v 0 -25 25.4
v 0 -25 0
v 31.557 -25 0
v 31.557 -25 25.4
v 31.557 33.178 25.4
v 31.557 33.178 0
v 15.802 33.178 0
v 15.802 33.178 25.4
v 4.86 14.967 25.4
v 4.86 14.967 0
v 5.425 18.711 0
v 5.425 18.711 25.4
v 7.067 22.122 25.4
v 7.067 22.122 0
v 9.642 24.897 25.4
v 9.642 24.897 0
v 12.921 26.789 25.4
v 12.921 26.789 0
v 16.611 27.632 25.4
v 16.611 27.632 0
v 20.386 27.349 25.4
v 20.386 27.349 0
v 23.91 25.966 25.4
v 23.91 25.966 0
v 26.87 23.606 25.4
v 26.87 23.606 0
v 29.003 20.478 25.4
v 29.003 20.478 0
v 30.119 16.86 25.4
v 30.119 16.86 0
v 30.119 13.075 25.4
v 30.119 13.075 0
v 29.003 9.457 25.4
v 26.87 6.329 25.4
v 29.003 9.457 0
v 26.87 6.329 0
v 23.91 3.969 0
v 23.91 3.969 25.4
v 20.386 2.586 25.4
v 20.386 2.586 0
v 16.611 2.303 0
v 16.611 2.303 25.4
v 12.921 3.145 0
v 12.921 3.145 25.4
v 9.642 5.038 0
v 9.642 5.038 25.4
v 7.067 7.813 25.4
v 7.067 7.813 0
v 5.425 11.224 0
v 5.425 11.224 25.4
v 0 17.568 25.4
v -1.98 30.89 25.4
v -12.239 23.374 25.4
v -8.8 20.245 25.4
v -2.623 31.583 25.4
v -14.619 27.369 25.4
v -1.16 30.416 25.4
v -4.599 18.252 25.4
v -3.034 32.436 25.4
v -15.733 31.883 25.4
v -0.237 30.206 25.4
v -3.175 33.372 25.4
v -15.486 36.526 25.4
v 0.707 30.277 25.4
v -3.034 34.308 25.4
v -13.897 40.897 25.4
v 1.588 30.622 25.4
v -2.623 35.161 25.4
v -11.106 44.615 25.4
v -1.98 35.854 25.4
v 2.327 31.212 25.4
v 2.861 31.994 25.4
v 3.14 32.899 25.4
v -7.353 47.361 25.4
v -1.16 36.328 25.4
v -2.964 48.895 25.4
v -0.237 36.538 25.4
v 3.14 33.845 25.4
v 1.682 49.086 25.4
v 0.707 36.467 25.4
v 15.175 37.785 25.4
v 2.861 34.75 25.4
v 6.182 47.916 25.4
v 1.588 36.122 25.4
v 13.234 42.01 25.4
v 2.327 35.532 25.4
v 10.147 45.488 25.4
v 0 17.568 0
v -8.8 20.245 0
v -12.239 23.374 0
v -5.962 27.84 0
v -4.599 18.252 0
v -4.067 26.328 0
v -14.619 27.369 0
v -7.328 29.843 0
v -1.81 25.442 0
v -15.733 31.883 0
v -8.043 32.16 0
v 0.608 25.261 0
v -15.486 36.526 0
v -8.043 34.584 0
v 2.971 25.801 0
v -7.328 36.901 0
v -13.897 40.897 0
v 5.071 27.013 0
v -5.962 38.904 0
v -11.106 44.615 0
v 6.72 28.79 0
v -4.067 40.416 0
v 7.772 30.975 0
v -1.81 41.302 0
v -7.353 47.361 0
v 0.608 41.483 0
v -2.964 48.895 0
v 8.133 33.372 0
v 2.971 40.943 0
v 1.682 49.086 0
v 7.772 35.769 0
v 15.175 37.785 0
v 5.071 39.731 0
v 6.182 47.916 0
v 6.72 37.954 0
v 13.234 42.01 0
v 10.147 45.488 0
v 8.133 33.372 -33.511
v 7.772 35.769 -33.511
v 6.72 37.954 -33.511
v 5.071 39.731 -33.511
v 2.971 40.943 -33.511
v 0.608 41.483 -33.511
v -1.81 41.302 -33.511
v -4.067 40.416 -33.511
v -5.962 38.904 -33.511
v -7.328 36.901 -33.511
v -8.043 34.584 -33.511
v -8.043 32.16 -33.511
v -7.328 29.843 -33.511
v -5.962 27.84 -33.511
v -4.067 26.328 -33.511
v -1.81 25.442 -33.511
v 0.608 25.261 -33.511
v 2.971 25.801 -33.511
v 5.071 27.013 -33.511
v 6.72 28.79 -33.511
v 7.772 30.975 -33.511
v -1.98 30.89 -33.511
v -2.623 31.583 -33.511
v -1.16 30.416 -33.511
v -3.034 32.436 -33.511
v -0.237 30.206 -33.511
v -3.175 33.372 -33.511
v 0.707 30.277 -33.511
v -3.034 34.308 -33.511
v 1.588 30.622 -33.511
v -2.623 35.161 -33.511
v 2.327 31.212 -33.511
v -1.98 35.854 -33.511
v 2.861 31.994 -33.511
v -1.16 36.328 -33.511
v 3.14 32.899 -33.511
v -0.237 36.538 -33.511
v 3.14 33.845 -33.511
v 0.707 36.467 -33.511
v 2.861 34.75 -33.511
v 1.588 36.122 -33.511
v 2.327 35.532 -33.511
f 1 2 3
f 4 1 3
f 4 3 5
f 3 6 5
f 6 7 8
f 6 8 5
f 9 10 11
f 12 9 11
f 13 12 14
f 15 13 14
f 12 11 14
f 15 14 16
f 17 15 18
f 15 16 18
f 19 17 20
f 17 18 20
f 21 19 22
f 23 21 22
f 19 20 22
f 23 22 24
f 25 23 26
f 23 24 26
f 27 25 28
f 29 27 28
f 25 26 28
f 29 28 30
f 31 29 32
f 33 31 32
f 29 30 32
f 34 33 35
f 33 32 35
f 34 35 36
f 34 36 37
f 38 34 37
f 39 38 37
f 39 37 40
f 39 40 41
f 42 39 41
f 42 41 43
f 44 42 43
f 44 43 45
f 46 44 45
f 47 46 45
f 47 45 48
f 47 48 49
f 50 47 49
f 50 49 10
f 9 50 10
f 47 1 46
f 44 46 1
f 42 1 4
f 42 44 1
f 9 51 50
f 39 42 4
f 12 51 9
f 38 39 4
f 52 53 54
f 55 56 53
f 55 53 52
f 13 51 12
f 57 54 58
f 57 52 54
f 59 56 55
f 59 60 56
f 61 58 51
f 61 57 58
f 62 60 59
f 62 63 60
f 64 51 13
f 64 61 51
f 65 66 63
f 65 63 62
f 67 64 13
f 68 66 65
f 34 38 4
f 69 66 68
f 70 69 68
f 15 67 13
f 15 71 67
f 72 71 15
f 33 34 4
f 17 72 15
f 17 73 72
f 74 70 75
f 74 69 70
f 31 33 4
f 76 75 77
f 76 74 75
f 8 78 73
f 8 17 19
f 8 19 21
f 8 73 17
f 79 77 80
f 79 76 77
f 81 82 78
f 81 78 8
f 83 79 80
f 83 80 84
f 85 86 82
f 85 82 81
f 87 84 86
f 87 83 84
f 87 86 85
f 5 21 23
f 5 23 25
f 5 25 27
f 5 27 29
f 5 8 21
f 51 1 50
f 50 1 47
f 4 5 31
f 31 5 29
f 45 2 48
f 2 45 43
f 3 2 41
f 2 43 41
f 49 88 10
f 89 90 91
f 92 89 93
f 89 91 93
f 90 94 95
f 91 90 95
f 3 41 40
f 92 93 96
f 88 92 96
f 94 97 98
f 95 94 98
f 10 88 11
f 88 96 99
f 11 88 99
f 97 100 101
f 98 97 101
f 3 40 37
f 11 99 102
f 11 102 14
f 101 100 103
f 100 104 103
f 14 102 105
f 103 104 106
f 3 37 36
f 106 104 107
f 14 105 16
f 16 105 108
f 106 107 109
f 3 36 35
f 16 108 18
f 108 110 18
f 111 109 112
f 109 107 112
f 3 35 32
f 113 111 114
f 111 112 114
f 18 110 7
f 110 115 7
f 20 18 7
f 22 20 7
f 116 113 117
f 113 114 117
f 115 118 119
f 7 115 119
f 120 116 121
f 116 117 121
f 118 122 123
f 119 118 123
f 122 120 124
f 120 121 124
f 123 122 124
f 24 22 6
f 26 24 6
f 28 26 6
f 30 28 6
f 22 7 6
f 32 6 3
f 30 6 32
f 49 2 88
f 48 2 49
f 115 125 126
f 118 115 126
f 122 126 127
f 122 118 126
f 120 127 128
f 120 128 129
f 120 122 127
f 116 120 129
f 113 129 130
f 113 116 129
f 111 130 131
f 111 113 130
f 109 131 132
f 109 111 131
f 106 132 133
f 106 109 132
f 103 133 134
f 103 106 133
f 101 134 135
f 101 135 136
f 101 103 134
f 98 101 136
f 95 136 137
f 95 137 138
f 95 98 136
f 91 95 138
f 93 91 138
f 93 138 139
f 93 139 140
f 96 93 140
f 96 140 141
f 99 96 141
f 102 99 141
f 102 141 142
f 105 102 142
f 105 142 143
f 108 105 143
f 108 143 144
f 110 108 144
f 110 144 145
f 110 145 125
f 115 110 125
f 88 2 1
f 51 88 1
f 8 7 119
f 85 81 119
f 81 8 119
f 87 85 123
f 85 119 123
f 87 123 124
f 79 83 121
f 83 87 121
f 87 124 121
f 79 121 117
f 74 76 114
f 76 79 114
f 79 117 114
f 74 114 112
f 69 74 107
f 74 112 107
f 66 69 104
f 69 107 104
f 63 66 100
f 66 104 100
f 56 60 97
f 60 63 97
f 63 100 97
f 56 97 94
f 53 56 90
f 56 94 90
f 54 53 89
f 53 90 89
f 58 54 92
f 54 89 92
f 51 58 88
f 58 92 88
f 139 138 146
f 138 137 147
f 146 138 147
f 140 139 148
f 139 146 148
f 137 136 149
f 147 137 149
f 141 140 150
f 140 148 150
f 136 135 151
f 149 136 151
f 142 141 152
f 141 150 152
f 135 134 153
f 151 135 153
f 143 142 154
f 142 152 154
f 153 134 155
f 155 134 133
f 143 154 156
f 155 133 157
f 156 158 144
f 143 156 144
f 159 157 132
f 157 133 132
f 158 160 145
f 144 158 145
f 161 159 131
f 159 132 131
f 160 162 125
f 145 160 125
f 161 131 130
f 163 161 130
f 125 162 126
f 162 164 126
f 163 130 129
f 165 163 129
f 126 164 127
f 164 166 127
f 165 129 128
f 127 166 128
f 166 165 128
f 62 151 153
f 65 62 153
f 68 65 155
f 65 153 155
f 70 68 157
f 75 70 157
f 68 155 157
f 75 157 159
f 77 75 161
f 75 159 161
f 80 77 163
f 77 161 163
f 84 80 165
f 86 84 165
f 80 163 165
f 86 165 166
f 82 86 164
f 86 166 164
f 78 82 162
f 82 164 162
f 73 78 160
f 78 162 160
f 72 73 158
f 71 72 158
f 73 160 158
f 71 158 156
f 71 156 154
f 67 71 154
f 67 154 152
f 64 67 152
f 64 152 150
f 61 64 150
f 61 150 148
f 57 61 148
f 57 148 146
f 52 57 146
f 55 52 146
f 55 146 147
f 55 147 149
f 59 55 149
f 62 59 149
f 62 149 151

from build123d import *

# Parameters (mm, degrees)
F1_R      = 15.8036743057
F2_DEPTH  = 25.4
F0_W      = 31.5568223596
F0_H      = 33.1780388951
F3_DEPTH  = 25.4
F4_R      = 8.1334827116
F5_DEPTH  = 58.9108746499
F7_D      = 6.35
F9_D      = 25.4
F14_DEPTH = 25


# Not quite as in the source:
# - the program builds the solid bodies; features that only make, move or delete a surface that nothing else refers to are left out


with BuildPart() as f2:
    # F1 (on face) → F2 (new body)
    with BuildSketch(Plane.XY):
        with Locations((0, 33.3719775081)):
            Circle(F1_R)
    extrude(amount=F2_DEPTH)

    # F0 (on Top) → F3 (join)
    with BuildSketch(Plane.XY):
        with Locations((15.7784111798, 16.5890194476)):
            Rectangle(F0_W, F0_H)
    extrude(amount=F3_DEPTH)

    # F4 (on face) → F5 (join)
    with BuildSketch(Plane.XY.offset(25.4)):
        with Locations((0, 33.3719775081)):
            Circle(F4_R)
    extrude(amount=-F5_DEPTH)

    # F7 (through all)
    with Locations(Plane.XY.offset(25.4)):
        with Locations((0, 33.3719775081)):
            Hole(F7_D / 2)

    # F9 (through all)
    with Locations(Plane.XY.offset(25.4)):
        with Locations((17.5604298711, 14.967338182)):
            Hole(F9_D / 2)

    # F14 (add): a face of the model
    f14_faces = [f2.faces().sort_by_distance(p)[0] for p in [
        (15.7784111798, 0, 12.7),
    ]]
    extrude(f14_faces, amount=F14_DEPTH)


solid = f2.part
